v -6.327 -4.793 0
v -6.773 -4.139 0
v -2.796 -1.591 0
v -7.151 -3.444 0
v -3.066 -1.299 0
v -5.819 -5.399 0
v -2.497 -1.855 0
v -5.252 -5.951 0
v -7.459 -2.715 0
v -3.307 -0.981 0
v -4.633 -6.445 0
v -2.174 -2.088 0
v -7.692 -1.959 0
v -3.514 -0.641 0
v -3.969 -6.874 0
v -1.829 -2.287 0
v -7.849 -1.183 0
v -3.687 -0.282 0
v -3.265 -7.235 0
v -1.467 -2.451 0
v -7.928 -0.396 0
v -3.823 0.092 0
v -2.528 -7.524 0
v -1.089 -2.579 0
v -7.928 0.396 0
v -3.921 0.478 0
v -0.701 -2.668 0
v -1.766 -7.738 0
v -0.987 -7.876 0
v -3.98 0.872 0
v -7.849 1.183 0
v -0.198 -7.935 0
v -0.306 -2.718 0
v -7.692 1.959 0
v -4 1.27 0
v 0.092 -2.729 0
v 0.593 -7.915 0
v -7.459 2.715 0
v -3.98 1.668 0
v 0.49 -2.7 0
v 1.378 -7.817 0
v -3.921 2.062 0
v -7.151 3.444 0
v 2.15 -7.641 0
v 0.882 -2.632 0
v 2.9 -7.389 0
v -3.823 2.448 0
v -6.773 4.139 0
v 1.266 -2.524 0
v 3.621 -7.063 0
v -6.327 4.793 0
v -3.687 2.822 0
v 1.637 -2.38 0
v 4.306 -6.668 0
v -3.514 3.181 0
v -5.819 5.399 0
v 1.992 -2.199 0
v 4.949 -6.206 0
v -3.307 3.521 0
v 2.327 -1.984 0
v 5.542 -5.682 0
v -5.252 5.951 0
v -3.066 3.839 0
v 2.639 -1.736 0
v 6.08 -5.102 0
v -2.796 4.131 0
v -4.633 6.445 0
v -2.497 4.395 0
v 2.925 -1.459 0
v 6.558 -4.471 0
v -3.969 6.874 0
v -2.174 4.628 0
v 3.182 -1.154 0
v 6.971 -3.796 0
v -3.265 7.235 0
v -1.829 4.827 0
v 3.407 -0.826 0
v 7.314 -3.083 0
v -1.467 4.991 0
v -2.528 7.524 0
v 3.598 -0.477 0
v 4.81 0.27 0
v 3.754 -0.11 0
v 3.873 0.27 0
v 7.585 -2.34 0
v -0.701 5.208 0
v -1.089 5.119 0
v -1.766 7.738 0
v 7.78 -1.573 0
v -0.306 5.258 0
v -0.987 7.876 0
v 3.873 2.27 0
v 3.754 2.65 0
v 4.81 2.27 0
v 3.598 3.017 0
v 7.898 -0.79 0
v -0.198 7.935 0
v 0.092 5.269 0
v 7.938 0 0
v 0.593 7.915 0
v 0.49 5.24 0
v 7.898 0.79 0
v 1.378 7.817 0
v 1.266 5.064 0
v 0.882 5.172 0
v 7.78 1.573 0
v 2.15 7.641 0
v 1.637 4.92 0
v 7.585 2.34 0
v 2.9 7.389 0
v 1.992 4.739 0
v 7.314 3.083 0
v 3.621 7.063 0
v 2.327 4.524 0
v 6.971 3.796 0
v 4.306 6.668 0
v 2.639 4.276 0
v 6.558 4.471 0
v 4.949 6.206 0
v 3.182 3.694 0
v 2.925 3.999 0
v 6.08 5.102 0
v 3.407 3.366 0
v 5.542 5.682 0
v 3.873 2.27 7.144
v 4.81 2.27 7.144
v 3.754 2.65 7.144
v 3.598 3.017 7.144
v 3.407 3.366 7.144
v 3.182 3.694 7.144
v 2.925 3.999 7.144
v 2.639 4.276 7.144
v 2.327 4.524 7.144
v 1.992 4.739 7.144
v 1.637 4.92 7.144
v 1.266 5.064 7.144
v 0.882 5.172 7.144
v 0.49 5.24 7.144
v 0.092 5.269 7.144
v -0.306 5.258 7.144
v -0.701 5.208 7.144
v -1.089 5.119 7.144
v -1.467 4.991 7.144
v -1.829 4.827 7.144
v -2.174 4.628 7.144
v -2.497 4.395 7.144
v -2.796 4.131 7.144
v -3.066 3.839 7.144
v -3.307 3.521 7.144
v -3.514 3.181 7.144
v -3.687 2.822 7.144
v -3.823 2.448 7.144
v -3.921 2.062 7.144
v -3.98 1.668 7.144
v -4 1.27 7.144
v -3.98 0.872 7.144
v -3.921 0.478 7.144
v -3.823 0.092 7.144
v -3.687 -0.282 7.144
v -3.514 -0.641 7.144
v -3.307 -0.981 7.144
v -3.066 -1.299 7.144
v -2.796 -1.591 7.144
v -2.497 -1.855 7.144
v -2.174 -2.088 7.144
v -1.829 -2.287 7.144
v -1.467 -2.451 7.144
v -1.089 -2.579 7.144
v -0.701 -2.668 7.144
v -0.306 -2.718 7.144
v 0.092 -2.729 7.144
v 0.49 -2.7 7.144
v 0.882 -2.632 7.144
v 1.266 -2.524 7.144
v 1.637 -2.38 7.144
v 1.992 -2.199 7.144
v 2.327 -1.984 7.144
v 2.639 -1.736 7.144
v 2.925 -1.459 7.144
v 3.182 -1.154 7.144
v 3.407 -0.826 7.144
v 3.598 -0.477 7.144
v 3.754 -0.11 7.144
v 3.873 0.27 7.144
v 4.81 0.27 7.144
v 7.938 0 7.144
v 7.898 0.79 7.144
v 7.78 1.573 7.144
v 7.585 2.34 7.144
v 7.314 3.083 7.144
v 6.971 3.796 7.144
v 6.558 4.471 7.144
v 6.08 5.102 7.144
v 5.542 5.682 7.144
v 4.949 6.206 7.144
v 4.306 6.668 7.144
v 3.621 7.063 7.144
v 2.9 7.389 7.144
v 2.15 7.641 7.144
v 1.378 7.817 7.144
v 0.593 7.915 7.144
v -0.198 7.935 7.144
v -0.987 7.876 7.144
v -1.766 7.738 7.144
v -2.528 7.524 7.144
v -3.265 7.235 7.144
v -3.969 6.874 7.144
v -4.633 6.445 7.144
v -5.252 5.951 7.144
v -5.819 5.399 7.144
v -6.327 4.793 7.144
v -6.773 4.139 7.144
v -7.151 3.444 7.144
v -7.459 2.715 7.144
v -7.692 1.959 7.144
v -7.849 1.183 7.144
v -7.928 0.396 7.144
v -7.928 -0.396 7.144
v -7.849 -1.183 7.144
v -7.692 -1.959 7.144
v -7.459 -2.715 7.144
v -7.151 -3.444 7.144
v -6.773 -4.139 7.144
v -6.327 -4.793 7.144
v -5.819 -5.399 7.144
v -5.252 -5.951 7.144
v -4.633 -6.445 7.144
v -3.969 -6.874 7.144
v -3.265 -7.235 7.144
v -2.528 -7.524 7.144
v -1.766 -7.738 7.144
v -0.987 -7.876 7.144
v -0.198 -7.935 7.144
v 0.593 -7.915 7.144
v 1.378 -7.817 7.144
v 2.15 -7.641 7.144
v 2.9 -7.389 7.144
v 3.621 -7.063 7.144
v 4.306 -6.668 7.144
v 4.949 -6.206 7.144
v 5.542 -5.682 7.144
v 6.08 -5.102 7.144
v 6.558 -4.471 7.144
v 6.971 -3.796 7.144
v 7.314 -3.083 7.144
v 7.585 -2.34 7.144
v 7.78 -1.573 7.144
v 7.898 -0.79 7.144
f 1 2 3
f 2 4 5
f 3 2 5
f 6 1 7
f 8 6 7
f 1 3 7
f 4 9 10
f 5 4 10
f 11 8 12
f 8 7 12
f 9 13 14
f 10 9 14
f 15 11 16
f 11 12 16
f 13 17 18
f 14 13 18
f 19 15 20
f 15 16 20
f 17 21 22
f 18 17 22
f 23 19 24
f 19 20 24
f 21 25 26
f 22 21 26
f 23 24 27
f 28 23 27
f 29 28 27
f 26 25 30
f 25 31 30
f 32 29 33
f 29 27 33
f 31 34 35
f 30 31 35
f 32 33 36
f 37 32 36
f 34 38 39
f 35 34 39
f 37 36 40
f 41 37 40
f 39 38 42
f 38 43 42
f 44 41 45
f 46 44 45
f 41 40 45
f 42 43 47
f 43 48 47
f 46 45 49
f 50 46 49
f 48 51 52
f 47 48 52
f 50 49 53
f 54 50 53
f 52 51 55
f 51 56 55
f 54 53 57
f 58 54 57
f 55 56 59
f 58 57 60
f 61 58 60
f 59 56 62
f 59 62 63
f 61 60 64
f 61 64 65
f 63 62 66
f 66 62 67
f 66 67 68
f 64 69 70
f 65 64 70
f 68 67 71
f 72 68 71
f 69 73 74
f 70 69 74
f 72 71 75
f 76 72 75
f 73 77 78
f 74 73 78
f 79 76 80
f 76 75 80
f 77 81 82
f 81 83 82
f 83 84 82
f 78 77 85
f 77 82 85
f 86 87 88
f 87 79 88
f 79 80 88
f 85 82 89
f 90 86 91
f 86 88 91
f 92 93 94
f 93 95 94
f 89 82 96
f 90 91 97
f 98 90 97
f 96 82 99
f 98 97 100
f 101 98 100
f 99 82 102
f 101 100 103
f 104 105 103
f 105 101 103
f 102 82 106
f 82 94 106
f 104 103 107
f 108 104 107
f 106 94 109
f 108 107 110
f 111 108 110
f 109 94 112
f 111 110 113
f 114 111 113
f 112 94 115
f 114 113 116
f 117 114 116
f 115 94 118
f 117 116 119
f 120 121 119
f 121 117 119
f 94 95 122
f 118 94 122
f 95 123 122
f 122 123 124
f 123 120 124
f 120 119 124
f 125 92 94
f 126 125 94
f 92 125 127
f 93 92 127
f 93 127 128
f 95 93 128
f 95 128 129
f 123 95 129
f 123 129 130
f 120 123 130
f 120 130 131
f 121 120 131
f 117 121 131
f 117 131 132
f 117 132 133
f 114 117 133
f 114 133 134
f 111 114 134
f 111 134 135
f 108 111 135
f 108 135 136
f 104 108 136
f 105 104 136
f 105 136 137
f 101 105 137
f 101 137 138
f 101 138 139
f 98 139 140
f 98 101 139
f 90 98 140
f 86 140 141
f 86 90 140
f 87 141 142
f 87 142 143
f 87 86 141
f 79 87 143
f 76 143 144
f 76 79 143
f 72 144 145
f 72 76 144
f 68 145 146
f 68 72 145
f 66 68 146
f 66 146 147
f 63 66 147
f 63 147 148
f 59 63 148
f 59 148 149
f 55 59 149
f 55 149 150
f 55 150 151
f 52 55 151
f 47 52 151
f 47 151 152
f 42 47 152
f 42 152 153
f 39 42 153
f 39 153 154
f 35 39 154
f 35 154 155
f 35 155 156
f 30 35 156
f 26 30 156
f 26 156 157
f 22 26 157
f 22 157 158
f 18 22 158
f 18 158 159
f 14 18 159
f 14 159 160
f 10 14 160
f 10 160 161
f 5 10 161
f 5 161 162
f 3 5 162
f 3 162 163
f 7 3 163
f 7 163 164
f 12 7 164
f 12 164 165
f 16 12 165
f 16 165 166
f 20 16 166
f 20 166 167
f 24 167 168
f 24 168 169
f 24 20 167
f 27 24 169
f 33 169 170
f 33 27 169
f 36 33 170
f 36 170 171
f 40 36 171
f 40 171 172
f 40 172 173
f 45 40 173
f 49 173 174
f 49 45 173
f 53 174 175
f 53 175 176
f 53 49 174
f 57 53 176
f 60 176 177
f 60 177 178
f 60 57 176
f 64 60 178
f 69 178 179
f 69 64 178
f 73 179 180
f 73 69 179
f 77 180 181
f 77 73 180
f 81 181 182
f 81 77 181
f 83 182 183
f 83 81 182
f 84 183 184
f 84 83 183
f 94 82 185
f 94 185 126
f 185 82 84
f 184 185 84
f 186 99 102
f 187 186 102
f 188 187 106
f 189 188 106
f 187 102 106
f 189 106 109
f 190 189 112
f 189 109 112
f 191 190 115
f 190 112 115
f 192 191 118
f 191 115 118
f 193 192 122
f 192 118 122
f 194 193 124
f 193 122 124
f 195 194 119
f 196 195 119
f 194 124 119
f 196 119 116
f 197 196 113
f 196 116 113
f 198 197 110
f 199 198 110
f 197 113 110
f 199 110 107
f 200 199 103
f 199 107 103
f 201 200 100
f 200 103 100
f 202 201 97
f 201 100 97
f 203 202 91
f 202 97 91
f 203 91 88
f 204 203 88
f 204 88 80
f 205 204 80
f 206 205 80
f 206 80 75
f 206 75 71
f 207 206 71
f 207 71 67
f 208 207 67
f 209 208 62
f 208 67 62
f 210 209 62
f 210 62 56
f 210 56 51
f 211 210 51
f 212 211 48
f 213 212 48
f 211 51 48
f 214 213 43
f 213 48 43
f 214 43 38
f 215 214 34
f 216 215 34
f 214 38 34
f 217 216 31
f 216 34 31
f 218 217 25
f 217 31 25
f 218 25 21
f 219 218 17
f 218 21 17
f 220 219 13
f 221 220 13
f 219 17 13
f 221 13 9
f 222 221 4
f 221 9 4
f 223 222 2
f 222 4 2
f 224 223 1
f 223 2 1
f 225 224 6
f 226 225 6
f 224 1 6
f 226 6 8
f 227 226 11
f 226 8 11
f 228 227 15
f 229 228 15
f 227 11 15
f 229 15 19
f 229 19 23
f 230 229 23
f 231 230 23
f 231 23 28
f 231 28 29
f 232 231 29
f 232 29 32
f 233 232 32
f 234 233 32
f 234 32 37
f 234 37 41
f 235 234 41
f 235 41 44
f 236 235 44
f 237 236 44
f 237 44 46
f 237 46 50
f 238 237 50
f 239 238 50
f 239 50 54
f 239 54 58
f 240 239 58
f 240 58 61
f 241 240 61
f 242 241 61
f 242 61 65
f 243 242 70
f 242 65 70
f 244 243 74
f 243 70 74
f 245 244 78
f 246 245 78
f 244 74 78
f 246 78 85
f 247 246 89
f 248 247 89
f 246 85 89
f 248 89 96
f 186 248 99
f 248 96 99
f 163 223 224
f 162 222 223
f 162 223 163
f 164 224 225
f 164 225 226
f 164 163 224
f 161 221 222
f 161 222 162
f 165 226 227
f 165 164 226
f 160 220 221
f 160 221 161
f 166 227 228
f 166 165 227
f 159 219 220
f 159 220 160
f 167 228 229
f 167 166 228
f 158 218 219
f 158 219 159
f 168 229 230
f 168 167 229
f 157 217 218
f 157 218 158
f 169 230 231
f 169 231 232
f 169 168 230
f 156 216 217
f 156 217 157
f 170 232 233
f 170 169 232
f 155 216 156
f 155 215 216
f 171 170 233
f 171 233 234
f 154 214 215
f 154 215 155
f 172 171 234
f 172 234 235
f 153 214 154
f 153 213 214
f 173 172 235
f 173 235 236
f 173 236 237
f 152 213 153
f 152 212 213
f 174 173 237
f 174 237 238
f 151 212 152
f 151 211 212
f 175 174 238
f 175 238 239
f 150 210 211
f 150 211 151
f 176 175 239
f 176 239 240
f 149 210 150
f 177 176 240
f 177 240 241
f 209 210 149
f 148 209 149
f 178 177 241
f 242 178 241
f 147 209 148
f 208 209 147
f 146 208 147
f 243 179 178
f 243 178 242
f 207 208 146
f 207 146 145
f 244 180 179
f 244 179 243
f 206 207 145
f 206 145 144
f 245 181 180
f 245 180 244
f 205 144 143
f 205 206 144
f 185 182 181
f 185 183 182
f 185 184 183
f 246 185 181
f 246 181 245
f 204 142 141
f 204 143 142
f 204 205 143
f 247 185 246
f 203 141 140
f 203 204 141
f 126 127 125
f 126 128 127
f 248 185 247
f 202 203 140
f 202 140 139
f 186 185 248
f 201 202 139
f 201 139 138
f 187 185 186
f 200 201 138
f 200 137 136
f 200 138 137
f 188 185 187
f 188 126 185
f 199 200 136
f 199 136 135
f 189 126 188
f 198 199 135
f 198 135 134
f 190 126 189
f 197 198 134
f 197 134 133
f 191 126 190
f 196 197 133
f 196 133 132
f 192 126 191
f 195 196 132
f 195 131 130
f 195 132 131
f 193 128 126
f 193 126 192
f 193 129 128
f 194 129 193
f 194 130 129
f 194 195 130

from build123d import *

# Parameters (mm, degrees)
SKETCH1_R           = 7.9375
SKETCH1_R_2         = 4
BOSS_EXTRUDE1_DEPTH = 7.14375
CUT_EXTRUDE2_DEPTH  = 14.3056746


with BuildPart() as part:
    # Sketch1 → Boss-Extrude1 (new body)
    with BuildSketch(Plane.XY):
        Circle(SKETCH1_R)
        with Locations((0, 1.27)):
            Circle(SKETCH1_R_2, mode=Mode.SUBTRACT)
    extrude(amount=BOSS_EXTRUDE1_DEPTH)

    # Sketch8 → Cut-Extrude2 (cut, through all)
    with BuildSketch(Plane(origin=(0, 0, 0), x_dir=(-1, 0, 0), z_dir=(0, 0, -1))):
        Polygon((-4, 0.27), (-4.809500032, 0.27), (-4.809500032, 2.27), (-4, 2.27), (-3.872983346, 2.27), (-3.872983346, 0.27), align=None)
    extrude(amount=-CUT_EXTRUDE2_DEPTH, mode=Mode.SUBTRACT)


solid = part.part
